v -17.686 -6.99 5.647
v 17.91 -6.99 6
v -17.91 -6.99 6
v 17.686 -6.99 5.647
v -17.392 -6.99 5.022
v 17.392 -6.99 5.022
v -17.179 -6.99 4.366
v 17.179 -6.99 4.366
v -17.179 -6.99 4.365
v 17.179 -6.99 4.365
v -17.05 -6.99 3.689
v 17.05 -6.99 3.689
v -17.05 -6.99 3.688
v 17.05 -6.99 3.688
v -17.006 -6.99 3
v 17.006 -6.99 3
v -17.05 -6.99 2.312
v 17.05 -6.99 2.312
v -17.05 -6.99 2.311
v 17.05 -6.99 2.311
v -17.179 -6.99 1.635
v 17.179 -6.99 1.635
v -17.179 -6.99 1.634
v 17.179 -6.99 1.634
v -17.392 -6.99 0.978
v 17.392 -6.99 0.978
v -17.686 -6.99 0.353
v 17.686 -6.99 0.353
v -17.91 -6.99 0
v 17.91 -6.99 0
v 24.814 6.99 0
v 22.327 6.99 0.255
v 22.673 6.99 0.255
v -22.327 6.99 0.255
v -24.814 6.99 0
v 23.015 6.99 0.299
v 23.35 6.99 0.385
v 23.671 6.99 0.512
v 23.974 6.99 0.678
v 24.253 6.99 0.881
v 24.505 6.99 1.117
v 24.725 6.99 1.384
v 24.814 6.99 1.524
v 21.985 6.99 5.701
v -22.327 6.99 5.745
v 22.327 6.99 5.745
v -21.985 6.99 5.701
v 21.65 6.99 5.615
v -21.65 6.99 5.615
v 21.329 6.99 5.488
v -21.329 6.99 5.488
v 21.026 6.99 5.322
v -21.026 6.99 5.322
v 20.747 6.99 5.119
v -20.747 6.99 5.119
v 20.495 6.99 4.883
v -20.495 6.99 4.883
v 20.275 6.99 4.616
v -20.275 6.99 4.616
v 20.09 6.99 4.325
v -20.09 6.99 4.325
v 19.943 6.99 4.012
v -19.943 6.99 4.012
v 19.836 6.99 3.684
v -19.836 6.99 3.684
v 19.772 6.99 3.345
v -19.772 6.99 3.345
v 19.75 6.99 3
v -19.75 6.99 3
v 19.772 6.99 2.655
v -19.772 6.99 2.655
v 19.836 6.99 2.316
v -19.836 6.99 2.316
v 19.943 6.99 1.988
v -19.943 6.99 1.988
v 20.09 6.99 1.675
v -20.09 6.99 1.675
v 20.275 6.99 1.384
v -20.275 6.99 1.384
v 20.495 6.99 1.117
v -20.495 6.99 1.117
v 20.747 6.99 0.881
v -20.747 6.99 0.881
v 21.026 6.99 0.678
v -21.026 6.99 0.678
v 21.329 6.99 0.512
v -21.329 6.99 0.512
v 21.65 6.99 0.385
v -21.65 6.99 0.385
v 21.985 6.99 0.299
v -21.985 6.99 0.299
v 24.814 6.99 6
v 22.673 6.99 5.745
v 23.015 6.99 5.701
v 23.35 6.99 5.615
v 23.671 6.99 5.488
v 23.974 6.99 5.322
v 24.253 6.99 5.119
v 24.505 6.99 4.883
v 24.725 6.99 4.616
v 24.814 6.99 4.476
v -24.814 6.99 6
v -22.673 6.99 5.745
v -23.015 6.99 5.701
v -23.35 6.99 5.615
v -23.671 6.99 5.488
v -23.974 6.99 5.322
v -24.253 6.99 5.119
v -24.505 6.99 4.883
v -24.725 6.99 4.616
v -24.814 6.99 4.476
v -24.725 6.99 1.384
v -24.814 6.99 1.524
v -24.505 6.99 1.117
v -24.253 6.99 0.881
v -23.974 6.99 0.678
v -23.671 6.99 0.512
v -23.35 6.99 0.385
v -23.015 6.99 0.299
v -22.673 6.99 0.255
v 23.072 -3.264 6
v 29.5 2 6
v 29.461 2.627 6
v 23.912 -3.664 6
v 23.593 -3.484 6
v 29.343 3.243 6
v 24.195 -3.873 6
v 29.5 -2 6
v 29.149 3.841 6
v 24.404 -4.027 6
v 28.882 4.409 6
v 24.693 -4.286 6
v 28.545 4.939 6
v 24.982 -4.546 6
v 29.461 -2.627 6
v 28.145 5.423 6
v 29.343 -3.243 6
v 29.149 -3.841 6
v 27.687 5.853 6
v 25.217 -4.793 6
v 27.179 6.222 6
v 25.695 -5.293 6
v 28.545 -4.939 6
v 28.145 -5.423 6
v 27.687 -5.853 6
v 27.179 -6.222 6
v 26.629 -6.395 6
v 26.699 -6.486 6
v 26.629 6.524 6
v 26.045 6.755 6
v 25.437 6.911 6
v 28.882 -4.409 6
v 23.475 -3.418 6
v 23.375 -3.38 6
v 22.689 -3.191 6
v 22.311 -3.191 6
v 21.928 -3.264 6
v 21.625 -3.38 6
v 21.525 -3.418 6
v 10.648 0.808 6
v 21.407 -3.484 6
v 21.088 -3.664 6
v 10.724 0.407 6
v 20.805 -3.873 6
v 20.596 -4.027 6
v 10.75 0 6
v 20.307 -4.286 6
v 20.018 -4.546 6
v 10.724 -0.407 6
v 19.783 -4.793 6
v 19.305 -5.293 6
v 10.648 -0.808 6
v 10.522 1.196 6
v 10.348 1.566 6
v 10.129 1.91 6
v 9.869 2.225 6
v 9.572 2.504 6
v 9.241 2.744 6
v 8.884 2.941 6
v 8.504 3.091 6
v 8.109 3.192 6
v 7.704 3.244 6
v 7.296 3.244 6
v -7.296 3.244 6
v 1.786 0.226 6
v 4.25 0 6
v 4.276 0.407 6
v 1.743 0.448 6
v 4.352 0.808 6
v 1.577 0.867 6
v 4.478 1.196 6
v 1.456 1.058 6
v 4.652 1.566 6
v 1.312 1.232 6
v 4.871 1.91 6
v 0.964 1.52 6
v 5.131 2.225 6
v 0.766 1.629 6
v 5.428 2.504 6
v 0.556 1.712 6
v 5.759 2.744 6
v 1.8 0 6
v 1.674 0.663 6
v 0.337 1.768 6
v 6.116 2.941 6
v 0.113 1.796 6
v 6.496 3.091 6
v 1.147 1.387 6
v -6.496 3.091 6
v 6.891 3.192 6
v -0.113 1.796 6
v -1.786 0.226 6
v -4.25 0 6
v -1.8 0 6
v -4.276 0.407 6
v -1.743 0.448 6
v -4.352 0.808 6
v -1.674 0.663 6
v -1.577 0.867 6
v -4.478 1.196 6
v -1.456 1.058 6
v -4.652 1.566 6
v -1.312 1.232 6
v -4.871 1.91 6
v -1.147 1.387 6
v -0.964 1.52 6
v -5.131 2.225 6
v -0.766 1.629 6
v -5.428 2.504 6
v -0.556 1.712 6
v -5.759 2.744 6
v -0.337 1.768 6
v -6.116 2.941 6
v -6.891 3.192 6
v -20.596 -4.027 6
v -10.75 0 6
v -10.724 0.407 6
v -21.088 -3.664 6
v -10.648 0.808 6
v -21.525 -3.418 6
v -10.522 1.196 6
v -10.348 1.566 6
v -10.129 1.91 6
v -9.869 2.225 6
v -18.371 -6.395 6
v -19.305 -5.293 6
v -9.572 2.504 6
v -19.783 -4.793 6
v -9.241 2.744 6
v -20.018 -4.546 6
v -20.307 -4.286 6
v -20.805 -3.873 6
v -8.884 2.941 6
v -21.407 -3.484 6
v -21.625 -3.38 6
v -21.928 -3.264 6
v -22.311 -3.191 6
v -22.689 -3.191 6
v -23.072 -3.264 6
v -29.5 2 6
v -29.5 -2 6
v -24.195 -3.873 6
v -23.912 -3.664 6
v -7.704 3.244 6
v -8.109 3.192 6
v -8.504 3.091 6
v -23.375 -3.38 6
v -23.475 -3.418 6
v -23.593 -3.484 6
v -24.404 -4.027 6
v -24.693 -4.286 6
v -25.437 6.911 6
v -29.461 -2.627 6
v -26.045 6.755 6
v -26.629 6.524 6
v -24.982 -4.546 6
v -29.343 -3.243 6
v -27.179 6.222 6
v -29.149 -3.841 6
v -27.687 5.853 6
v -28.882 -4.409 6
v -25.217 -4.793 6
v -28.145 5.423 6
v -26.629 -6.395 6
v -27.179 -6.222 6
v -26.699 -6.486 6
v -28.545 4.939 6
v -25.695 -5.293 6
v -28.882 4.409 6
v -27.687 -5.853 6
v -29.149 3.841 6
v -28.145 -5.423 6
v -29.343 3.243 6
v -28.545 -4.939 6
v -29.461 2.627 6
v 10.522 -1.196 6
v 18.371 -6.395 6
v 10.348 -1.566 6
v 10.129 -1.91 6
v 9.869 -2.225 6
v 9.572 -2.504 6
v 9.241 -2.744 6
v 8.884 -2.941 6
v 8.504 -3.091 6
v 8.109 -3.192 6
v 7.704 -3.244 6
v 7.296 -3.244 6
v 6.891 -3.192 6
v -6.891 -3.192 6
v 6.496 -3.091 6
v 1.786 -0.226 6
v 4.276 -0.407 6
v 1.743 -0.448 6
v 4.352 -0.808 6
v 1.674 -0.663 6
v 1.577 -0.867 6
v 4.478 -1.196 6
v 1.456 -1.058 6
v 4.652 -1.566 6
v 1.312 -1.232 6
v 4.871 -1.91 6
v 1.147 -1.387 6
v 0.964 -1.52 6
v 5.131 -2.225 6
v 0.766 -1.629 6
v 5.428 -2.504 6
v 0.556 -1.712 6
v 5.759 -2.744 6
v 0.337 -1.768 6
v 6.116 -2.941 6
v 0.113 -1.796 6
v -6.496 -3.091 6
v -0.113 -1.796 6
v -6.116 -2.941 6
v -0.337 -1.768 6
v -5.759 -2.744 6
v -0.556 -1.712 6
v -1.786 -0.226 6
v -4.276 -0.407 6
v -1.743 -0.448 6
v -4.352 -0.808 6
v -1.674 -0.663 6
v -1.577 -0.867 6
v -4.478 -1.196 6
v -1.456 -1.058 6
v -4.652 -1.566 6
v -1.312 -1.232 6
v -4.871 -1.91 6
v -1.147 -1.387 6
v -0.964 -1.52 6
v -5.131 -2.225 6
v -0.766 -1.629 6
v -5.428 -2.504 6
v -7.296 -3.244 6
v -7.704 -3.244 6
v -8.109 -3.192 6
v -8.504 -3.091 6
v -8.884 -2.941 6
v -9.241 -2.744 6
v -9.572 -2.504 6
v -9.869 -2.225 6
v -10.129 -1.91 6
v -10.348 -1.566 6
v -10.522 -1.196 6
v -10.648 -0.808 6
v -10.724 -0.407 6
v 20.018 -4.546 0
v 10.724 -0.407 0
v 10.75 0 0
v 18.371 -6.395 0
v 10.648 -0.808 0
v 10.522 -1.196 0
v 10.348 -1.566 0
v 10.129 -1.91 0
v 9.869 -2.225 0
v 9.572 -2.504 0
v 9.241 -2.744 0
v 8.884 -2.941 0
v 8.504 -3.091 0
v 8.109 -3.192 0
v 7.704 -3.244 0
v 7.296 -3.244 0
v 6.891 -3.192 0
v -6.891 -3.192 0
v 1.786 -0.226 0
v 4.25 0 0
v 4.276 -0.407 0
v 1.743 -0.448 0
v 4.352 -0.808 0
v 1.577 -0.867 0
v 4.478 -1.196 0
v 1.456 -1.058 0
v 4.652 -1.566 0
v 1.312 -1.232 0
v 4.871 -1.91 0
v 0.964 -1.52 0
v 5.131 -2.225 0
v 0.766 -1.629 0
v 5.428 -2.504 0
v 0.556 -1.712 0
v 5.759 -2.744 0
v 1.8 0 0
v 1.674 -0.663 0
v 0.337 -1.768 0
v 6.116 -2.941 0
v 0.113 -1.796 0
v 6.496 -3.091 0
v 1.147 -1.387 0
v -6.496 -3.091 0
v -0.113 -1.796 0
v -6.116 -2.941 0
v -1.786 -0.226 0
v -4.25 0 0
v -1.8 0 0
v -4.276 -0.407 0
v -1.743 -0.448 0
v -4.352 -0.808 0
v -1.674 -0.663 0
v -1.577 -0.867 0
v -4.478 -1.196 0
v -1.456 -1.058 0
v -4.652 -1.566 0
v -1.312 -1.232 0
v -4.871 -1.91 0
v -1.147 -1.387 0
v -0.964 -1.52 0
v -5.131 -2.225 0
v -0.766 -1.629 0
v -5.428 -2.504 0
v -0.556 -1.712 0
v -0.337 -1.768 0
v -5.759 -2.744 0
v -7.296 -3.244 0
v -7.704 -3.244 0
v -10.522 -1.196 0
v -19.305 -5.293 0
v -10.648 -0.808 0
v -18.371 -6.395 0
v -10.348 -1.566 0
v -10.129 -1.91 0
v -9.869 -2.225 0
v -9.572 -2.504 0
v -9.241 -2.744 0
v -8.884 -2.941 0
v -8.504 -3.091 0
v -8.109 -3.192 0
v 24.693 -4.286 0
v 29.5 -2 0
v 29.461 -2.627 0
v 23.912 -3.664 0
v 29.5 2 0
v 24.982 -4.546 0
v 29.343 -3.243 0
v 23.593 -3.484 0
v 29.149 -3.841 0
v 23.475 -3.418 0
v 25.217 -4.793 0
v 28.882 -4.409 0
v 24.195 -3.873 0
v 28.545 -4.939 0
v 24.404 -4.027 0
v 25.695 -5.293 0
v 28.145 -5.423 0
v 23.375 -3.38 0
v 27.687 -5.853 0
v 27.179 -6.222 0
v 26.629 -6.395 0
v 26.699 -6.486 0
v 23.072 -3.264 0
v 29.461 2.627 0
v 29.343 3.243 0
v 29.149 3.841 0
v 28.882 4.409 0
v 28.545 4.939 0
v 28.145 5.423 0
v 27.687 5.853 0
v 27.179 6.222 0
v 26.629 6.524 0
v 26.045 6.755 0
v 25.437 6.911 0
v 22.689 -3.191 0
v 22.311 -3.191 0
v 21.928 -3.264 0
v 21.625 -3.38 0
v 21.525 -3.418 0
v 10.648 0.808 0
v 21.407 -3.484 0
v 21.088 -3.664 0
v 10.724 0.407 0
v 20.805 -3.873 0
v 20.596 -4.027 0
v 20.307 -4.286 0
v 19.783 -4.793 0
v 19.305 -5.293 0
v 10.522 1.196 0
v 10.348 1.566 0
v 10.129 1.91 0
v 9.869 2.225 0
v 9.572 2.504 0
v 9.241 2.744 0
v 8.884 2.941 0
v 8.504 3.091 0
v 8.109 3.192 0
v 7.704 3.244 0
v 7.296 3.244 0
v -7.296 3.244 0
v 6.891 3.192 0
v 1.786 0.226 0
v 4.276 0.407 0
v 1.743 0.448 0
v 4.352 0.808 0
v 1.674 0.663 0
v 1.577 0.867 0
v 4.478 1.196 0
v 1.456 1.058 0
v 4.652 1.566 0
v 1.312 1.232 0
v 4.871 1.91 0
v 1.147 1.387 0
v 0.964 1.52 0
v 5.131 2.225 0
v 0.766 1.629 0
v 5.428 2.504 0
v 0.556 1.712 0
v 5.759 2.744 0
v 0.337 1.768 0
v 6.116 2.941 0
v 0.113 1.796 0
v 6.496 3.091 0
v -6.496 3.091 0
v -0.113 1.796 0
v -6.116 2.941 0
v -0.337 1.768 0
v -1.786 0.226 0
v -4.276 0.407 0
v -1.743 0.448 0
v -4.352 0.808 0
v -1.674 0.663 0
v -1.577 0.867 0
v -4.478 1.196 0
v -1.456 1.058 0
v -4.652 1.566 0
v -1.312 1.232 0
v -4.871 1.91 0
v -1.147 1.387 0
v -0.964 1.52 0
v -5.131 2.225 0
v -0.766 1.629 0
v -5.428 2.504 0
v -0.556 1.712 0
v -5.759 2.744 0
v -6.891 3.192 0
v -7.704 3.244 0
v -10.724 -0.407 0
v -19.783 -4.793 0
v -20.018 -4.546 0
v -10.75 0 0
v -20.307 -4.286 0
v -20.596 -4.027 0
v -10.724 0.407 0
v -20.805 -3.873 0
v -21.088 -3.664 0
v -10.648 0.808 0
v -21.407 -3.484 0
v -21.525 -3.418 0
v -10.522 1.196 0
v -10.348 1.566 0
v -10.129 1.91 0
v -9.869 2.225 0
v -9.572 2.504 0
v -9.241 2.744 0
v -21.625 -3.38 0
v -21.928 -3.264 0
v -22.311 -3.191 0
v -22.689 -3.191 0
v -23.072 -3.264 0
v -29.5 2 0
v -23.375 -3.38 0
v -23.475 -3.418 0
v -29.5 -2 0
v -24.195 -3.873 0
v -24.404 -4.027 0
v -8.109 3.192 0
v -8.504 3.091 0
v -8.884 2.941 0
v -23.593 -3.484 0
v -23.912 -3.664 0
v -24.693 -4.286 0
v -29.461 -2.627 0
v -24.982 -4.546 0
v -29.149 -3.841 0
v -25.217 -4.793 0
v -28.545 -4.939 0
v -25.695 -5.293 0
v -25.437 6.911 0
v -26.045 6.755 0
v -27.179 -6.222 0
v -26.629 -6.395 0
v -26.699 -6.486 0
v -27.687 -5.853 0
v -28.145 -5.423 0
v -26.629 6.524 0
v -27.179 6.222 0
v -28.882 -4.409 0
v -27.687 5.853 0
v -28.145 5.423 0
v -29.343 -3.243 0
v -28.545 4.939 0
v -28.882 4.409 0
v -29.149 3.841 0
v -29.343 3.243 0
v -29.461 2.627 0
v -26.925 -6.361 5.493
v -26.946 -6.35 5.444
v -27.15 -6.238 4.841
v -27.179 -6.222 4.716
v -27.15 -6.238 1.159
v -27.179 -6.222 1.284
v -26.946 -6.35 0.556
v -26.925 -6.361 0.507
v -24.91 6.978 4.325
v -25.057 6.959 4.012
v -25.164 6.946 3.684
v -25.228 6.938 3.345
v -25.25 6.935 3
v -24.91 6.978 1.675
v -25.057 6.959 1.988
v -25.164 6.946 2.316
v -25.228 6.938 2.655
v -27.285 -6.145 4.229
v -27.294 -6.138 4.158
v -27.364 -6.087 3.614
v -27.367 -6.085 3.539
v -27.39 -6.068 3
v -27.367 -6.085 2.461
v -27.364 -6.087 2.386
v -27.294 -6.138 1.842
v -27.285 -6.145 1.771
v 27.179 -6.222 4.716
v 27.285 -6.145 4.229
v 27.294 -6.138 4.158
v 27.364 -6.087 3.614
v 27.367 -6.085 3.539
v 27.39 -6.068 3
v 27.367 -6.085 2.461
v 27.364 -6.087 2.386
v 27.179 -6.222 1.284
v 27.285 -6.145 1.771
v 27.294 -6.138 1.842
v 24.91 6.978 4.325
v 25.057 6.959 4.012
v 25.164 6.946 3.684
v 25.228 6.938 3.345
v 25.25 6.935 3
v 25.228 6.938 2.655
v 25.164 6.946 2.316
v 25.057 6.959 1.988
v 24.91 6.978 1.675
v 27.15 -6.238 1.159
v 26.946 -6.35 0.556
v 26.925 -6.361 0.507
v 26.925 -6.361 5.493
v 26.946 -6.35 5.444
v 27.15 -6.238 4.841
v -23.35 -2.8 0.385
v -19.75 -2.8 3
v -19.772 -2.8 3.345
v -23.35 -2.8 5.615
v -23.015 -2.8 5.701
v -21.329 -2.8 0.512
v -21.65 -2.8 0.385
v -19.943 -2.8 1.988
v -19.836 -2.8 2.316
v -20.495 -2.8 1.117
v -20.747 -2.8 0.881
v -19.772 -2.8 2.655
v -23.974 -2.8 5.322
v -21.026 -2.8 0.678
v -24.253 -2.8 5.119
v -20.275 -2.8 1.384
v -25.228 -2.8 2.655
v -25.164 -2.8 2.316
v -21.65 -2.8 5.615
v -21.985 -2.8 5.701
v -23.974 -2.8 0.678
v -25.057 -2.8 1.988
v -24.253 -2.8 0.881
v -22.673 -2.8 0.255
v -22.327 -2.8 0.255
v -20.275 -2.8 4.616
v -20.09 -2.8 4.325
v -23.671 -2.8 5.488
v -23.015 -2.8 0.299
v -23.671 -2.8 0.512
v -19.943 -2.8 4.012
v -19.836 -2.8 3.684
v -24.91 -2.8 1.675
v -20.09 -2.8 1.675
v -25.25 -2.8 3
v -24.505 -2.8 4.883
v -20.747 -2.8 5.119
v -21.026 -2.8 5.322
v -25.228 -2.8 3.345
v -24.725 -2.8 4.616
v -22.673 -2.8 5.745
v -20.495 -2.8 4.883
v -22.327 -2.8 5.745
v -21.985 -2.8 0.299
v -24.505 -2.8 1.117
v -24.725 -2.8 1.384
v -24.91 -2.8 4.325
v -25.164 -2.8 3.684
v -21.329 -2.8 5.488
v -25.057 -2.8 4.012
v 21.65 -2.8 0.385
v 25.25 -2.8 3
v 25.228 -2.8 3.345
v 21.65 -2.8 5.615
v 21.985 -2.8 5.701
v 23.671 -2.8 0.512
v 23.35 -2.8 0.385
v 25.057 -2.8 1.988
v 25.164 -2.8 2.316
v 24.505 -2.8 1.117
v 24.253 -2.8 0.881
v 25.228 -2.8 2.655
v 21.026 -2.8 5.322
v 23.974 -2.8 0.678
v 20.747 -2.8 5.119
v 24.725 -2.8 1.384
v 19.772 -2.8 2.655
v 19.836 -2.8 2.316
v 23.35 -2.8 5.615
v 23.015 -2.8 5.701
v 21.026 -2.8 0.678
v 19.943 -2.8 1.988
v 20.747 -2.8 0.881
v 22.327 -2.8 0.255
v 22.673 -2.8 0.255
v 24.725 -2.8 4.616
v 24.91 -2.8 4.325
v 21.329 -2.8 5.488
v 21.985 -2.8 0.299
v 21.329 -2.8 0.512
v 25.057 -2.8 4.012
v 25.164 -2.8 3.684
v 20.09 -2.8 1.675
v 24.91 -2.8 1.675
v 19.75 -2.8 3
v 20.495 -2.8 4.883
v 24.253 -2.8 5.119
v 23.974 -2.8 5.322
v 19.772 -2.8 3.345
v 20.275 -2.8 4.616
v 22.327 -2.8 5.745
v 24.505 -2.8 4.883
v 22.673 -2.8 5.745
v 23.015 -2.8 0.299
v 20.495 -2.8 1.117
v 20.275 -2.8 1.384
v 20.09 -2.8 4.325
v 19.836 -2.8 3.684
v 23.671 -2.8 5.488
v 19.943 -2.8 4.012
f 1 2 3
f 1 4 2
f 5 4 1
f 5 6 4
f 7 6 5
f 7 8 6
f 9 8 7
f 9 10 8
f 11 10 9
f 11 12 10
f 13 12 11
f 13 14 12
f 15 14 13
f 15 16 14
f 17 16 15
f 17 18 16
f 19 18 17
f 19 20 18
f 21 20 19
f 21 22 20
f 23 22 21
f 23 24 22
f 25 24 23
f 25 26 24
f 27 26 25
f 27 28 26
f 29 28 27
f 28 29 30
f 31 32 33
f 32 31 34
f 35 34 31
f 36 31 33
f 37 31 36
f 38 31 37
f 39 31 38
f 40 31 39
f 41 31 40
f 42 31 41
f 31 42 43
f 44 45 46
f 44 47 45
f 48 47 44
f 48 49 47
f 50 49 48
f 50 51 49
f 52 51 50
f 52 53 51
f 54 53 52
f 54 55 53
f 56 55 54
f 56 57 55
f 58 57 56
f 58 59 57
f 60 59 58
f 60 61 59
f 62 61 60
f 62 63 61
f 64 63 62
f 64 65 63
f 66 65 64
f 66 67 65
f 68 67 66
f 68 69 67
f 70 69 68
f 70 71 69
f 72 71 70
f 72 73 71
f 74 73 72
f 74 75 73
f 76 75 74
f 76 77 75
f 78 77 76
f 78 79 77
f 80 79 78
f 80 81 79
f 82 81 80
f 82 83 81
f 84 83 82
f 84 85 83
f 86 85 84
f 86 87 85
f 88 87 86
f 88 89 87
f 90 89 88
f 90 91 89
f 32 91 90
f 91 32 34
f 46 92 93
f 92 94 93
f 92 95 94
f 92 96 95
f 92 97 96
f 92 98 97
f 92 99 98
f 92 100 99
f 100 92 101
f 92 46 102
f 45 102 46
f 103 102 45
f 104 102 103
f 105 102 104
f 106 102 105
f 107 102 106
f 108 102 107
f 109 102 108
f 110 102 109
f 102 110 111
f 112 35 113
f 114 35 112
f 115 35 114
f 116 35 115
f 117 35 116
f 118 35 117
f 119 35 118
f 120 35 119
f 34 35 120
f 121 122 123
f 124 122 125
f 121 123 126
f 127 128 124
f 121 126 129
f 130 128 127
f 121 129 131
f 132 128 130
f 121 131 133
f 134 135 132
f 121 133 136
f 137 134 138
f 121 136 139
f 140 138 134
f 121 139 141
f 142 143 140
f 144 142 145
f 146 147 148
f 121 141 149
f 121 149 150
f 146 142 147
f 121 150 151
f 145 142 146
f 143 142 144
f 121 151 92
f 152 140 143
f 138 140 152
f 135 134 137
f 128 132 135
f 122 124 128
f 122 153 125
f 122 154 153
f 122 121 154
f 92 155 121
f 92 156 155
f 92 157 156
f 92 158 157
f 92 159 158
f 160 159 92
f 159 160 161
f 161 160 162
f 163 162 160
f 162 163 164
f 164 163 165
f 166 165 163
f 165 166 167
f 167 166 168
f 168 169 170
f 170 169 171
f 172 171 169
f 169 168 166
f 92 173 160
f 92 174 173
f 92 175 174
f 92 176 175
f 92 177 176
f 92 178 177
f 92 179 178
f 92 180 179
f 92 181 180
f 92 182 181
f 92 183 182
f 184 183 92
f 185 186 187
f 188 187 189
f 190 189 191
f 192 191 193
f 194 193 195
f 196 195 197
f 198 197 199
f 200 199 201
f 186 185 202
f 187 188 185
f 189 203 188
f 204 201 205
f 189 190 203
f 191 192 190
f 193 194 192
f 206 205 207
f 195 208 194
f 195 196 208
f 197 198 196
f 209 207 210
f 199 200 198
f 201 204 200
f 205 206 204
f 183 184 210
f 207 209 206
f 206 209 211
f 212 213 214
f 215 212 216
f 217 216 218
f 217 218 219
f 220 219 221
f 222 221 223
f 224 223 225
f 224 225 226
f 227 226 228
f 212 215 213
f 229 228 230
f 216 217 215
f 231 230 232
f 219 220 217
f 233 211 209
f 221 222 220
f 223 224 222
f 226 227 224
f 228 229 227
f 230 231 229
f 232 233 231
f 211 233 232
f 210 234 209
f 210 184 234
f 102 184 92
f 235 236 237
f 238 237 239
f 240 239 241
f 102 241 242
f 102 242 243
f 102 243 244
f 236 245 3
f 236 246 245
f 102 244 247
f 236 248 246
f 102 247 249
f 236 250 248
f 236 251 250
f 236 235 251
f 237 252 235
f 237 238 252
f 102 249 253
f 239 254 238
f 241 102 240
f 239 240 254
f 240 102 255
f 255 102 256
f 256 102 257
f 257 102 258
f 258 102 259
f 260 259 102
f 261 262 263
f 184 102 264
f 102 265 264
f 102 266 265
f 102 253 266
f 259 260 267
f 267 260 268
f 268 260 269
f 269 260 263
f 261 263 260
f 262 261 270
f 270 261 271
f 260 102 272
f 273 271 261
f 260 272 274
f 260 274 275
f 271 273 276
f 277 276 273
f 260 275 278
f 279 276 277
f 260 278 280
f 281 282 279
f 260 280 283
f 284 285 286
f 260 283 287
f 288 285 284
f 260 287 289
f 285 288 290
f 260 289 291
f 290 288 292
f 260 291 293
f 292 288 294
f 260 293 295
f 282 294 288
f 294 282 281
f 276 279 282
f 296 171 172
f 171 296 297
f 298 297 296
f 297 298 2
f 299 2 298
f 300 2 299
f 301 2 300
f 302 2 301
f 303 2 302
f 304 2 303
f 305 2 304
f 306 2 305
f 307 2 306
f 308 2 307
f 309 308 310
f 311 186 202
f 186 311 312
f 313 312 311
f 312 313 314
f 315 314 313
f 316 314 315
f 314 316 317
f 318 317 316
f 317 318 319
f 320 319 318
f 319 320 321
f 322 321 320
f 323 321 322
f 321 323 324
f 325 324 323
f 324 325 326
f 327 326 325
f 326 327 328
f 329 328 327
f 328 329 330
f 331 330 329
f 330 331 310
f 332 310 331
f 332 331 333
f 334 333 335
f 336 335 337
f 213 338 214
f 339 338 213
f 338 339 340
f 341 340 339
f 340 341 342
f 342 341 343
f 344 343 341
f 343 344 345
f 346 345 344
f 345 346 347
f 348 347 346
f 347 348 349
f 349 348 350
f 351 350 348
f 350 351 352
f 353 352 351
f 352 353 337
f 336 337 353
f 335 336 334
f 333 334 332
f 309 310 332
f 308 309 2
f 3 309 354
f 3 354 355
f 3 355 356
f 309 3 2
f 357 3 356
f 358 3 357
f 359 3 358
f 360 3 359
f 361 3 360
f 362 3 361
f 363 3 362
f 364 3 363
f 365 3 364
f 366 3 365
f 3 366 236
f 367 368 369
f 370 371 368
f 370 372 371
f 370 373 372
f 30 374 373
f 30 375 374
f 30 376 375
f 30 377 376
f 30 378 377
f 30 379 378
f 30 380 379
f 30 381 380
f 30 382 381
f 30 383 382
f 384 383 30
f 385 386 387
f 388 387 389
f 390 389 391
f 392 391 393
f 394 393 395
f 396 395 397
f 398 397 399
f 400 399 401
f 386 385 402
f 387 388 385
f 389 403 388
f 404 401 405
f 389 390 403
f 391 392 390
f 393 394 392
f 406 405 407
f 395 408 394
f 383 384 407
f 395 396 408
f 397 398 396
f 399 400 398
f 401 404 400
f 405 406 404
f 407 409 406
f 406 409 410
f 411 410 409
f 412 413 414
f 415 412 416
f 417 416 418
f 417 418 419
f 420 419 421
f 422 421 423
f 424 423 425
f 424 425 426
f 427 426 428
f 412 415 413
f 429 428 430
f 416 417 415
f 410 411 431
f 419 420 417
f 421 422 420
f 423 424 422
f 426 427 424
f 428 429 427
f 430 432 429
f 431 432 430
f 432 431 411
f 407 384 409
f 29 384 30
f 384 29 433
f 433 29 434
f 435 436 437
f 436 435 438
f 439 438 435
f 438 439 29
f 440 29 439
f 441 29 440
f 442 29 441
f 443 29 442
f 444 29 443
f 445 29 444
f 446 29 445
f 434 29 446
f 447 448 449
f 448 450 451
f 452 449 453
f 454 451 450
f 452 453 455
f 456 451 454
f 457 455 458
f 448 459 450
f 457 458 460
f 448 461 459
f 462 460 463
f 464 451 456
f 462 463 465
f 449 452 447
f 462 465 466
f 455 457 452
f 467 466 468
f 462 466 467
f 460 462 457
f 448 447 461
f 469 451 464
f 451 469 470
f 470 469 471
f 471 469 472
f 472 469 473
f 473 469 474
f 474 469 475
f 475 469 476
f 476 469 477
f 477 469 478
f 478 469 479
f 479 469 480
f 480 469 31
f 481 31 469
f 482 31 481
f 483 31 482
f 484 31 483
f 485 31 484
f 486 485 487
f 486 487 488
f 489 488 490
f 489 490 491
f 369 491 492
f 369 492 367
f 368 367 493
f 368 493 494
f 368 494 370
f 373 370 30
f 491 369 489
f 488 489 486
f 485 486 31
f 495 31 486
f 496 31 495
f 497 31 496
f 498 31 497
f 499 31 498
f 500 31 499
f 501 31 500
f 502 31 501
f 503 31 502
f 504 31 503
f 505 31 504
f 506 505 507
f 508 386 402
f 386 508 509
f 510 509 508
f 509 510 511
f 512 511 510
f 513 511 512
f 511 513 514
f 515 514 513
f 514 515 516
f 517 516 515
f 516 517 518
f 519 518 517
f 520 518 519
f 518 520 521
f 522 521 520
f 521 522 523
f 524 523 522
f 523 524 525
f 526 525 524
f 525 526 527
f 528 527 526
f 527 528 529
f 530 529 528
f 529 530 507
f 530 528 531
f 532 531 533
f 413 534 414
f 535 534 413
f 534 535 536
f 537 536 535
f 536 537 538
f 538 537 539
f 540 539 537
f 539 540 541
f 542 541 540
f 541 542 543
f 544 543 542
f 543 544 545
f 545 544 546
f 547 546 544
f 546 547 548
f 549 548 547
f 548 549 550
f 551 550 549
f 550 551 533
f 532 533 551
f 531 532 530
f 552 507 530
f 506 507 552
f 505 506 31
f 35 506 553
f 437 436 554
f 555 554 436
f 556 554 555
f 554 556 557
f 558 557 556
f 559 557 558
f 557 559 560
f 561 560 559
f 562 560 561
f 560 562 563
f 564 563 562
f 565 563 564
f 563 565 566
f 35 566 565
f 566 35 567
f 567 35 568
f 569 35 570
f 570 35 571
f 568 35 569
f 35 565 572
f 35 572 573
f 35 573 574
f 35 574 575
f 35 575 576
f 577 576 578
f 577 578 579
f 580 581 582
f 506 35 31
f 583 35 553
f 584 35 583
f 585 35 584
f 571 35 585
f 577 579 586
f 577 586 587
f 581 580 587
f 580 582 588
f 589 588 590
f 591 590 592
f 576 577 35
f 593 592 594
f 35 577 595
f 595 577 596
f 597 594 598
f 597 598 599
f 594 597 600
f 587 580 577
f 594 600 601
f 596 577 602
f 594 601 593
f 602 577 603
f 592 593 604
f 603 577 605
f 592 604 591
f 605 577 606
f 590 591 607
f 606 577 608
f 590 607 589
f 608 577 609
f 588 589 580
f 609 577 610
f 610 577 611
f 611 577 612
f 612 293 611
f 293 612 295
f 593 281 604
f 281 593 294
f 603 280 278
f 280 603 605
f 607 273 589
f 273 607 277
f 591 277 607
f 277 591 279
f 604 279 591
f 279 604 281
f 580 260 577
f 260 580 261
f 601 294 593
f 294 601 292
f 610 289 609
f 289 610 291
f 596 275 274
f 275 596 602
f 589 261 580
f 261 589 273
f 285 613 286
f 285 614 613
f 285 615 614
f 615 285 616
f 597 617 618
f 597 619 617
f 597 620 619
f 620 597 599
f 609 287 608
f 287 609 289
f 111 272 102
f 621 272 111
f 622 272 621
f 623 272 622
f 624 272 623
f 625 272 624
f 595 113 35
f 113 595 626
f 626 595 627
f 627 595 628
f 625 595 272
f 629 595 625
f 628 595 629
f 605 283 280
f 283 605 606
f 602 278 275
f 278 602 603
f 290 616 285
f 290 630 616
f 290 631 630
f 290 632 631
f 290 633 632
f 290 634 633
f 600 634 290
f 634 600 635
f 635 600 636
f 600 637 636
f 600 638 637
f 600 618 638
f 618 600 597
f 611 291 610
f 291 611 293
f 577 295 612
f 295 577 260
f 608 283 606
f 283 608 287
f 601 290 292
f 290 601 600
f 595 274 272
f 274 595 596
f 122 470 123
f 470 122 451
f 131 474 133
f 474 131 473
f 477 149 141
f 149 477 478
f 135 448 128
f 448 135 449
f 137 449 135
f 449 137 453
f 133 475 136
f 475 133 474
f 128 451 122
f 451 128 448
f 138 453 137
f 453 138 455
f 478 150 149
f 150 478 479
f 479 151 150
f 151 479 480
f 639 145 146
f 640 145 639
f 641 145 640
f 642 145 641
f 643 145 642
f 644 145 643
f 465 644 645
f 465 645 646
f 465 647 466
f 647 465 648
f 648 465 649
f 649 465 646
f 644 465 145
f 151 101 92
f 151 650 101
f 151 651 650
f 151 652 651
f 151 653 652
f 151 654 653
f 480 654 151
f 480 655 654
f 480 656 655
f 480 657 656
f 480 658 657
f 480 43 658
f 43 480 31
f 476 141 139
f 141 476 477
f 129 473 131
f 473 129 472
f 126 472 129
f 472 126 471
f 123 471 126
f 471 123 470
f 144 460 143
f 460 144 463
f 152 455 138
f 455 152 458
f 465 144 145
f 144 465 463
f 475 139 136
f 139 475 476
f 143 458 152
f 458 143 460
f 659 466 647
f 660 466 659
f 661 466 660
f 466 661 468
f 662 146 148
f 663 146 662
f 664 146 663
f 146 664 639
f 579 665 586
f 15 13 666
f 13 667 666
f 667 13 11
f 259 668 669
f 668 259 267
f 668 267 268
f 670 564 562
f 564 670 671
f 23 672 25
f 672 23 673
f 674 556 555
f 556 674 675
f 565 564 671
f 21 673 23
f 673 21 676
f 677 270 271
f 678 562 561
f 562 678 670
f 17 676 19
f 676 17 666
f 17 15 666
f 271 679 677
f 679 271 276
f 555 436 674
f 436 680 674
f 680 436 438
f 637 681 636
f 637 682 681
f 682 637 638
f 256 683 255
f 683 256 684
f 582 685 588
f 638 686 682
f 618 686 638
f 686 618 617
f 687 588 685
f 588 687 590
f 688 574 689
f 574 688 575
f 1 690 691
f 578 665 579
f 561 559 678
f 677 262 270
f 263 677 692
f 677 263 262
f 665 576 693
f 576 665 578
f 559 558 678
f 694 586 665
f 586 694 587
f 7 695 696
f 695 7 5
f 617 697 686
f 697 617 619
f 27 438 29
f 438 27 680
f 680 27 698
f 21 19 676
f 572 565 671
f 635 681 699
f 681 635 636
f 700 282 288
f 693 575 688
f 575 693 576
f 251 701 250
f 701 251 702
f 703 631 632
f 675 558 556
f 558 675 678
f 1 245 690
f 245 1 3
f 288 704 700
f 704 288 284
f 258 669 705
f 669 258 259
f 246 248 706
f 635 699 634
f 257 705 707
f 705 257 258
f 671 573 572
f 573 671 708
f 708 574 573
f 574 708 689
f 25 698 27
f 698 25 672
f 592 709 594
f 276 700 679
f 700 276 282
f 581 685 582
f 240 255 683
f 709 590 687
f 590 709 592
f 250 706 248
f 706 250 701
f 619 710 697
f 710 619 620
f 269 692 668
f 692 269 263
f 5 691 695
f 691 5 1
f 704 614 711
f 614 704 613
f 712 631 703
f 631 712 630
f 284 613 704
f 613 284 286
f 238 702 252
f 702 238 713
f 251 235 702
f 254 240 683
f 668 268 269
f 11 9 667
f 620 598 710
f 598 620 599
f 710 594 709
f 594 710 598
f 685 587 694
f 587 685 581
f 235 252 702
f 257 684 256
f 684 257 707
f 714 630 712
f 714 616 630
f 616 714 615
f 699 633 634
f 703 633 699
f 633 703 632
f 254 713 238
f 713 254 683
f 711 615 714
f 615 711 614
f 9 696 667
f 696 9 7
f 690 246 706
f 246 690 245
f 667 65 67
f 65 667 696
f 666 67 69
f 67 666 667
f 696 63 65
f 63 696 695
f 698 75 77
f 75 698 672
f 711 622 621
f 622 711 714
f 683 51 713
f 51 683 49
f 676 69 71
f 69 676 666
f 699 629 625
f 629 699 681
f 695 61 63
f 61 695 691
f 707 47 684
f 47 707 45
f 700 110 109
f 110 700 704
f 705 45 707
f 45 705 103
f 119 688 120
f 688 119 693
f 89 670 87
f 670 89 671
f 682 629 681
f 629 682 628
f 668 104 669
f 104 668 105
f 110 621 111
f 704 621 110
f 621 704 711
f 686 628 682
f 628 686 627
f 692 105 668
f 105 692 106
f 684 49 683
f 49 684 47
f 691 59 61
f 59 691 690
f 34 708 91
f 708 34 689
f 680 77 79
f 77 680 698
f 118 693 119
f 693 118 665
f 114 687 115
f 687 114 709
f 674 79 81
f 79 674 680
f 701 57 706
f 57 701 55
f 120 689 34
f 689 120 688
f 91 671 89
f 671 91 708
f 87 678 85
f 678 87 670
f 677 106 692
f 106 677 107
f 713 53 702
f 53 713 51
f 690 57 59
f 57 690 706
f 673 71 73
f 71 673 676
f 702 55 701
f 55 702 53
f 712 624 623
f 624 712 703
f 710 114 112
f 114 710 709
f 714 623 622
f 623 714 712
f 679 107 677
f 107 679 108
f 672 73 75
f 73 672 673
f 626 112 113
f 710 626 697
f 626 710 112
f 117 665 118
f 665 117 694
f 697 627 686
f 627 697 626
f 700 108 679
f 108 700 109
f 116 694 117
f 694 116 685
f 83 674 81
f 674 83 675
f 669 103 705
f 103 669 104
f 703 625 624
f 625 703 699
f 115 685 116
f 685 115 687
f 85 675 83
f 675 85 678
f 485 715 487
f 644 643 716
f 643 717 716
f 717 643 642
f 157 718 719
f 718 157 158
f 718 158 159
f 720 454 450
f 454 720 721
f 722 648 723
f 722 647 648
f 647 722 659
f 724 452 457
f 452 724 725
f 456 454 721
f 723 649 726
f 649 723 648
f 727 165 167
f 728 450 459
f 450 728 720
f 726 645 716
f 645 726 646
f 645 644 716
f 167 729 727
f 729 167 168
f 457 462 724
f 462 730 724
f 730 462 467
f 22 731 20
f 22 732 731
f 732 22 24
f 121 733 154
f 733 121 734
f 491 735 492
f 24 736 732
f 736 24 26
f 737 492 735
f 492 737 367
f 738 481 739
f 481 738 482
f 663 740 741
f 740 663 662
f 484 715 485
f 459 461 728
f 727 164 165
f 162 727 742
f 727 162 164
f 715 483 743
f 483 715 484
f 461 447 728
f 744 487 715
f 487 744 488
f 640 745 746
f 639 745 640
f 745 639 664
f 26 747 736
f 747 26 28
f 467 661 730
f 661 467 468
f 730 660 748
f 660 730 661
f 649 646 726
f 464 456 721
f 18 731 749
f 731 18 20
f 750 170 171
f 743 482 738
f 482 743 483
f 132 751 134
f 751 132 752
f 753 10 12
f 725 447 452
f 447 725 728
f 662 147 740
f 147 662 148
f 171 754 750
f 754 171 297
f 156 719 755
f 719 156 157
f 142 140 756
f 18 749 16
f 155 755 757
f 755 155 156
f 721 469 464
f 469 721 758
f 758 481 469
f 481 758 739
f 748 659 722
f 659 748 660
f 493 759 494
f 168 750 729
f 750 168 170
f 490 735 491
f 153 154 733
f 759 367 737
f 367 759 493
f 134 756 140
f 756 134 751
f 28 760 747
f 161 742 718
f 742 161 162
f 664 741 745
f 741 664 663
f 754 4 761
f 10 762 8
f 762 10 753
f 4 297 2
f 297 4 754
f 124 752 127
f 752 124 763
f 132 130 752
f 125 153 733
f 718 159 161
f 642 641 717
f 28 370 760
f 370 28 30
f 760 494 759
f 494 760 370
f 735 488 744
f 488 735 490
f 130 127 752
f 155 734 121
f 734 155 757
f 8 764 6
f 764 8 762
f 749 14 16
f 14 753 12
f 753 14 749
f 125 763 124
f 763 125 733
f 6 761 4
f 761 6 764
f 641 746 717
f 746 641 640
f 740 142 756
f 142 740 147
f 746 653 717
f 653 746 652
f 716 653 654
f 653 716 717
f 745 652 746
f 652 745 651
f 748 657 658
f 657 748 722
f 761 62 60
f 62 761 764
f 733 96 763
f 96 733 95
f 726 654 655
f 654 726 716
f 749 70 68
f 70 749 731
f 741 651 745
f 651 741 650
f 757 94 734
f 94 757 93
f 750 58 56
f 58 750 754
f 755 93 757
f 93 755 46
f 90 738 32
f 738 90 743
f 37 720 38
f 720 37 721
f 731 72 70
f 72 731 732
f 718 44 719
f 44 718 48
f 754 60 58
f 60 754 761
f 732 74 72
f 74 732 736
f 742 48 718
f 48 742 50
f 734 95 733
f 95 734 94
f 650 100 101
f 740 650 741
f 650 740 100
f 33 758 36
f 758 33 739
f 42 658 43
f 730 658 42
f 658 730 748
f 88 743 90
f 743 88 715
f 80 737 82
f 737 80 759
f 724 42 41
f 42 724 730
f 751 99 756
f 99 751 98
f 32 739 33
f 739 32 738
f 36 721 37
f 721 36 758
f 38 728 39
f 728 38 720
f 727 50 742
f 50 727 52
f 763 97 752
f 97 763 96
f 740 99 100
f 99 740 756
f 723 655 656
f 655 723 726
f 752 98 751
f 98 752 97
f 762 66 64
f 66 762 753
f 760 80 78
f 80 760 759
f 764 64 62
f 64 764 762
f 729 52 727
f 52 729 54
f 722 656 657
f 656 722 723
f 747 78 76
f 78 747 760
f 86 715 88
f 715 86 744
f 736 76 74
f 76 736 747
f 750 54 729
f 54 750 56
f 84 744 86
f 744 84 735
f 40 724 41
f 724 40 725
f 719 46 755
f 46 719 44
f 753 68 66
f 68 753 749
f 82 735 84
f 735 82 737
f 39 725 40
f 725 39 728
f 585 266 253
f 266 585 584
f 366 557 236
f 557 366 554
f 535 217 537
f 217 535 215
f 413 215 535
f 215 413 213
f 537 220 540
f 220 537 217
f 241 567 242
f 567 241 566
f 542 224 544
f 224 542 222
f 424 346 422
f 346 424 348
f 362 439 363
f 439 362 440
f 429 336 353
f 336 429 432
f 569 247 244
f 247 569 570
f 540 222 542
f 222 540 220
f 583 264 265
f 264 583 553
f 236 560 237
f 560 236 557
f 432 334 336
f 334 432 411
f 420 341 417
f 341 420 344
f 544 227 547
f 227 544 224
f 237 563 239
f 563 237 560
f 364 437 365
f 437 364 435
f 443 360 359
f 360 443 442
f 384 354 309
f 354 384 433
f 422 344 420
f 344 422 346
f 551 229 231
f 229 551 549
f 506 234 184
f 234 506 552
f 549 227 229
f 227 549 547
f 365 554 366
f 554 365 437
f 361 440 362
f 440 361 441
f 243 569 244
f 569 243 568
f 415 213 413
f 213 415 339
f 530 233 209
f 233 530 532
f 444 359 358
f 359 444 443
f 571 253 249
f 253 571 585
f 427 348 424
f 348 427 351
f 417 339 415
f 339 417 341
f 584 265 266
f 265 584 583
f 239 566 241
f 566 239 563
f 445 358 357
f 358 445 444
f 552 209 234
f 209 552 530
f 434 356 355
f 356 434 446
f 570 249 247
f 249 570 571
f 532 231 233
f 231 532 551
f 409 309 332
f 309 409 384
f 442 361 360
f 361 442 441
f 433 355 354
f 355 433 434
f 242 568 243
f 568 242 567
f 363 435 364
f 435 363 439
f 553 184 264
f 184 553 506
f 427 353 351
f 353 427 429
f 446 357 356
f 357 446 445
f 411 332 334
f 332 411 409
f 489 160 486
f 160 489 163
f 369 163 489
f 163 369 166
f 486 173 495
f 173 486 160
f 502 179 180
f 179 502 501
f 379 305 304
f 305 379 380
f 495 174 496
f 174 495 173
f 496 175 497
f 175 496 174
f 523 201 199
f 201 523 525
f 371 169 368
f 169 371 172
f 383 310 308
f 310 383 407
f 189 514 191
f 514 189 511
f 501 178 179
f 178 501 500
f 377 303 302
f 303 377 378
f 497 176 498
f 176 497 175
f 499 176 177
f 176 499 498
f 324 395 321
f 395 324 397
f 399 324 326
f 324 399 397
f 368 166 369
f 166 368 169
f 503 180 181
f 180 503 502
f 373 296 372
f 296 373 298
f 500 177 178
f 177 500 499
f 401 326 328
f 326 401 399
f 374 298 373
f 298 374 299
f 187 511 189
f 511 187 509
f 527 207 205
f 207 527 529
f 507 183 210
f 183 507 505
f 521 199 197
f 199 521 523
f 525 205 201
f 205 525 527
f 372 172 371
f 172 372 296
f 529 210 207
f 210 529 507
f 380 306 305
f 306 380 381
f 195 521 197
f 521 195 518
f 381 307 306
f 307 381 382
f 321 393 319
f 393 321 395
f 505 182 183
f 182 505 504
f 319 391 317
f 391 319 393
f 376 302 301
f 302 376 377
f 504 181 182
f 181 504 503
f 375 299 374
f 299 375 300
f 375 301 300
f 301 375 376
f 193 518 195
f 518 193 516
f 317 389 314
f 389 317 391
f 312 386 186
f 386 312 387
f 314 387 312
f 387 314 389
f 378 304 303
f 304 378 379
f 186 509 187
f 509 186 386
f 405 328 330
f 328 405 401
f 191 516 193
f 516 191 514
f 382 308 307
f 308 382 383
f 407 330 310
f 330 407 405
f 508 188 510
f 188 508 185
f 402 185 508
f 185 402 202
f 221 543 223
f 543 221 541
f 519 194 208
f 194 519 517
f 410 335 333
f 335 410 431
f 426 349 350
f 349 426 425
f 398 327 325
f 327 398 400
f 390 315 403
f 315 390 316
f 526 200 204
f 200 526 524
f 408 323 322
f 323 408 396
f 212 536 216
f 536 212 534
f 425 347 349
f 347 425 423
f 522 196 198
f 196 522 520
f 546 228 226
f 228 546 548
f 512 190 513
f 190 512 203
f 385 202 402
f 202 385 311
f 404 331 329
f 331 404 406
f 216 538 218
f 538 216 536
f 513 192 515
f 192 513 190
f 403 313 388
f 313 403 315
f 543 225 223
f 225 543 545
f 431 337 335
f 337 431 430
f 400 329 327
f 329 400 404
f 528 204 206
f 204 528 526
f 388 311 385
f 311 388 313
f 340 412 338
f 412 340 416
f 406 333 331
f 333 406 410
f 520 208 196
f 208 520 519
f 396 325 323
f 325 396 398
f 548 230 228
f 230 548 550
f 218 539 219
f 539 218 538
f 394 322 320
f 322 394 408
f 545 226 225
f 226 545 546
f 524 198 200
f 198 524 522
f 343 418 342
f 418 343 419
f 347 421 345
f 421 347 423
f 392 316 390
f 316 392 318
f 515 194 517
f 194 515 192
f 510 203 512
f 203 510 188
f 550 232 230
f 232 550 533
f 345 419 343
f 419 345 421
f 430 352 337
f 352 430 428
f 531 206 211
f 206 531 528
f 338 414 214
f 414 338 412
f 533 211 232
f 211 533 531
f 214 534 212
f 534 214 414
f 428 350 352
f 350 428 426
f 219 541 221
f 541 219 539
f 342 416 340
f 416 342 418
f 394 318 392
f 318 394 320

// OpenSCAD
$fn = 50;


difference() {
	union() {
		hull() {
			translate(v = [-9.5000000000, 2.0000000000, 0]) {
				cylinder(h = 6, r = 5);
			}
			translate(v = [9.5000000000, 2.0000000000, 0]) {
				cylinder(h = 6, r = 5);
			}
			translate(v = [-9.5000000000, -2.0000000000, 0]) {
				cylinder(h = 6, r = 5);
			}
			translate(v = [9.5000000000, -2.0000000000, 0]) {
				cylinder(h = 6, r = 5);
			}
		}
		translate(v = [-15.0000000000, 0.0000000000, 0]) {
			hull() {
				translate(v = [-9.5000000000, 2.0000000000, 0]) {
					cylinder(h = 6, r = 5);
				}
				translate(v = [9.5000000000, 2.0000000000, 0]) {
					cylinder(h = 6, r = 5);
				}
				translate(v = [-9.5000000000, -2.0000000000, 0]) {
					cylinder(h = 6, r = 5);
				}
				translate(v = [9.5000000000, -2.0000000000, 0]) {
					cylinder(h = 6, r = 5);
				}
			}
		}
		translate(v = [15.0000000000, 0.0000000000, 0]) {
			hull() {
				translate(v = [-9.5000000000, 2.0000000000, 0]) {
					cylinder(h = 6, r = 5);
				}
				translate(v = [9.5000000000, 2.0000000000, 0]) {
					cylinder(h = 6, r = 5);
				}
				translate(v = [-9.5000000000, -2.0000000000, 0]) {
					cylinder(h = 6, r = 5);
				}
				translate(v = [9.5000000000, -2.0000000000, 0]) {
					cylinder(h = 6, r = 5);
				}
			}
		}
	}
	union() {
		translate(v = [-22.5000000000, -7.0000000000, 3.0000000000]) {
			rotate(a = [90, 0, 0]) {
				difference() {
					union() {
						#translate(v = [0, 0, -14.0000000000]) {
							cylinder(h = 14, r = 2.2500000000);
						}
						#translate(v = [0, 0, -4.2000000000]) {
							cylinder(h = 4.2000000000, r1 = 2.7500000000, r2 = 5.5000000000);
						}
						#translate(v = [0, 0, -14.0000000000]) {
							cylinder(h = 14, r = 2.7500000000);
						}
						#translate(v = [0, 0, -14.0000000000]) {
							cylinder(h = 14, r = 2.2500000000);
						}
					}
					union();
				}
			}
		}
		translate(v = [22.5000000000, -7.0000000000, 3.0000000000]) {
			rotate(a = [90, 0, 0]) {
				difference() {
					union() {
						#translate(v = [0, 0, -14.0000000000]) {
							cylinder(h = 14, r = 2.2500000000);
						}
						#translate(v = [0, 0, -4.2000000000]) {
							cylinder(h = 4.2000000000, r1 = 2.7500000000, r2 = 5.5000000000);
						}
						#translate(v = [0, 0, -14.0000000000]) {
							cylinder(h = 14, r = 2.7500000000);
						}
						#translate(v = [0, 0, -14.0000000000]) {
							cylinder(h = 14, r = 2.2500000000);
						}
					}
					union();
				}
			}
		}
		translate(v = [-7.5000000000, 0.0000000000, 0]) {
			translate(v = [0, 0, -100]) {
				cylinder(h = 200, r = 3.2500000000);
			}
		}
		translate(v = [7.5000000000, 0.0000000000, 0]) {
			translate(v = [0, 0, -100]) {
				cylinder(h = 200, r = 3.2500000000);
			}
		}
		translate(v = [-7.5000000000, 0.0000000000, 0]) {
			translate(v = [0, 0, -100]) {
				cylinder(h = 200, r = 1.8000000000);
			}
		}
		translate(v = [0, 0, -100]) {
			cylinder(h = 200, r = 1.8000000000);
		}
		translate(v = [7.5000000000, 0.0000000000, 0]) {
			translate(v = [0, 0, -100]) {
				cylinder(h = 200, r = 1.8000000000);
			}
		}
	}
}
